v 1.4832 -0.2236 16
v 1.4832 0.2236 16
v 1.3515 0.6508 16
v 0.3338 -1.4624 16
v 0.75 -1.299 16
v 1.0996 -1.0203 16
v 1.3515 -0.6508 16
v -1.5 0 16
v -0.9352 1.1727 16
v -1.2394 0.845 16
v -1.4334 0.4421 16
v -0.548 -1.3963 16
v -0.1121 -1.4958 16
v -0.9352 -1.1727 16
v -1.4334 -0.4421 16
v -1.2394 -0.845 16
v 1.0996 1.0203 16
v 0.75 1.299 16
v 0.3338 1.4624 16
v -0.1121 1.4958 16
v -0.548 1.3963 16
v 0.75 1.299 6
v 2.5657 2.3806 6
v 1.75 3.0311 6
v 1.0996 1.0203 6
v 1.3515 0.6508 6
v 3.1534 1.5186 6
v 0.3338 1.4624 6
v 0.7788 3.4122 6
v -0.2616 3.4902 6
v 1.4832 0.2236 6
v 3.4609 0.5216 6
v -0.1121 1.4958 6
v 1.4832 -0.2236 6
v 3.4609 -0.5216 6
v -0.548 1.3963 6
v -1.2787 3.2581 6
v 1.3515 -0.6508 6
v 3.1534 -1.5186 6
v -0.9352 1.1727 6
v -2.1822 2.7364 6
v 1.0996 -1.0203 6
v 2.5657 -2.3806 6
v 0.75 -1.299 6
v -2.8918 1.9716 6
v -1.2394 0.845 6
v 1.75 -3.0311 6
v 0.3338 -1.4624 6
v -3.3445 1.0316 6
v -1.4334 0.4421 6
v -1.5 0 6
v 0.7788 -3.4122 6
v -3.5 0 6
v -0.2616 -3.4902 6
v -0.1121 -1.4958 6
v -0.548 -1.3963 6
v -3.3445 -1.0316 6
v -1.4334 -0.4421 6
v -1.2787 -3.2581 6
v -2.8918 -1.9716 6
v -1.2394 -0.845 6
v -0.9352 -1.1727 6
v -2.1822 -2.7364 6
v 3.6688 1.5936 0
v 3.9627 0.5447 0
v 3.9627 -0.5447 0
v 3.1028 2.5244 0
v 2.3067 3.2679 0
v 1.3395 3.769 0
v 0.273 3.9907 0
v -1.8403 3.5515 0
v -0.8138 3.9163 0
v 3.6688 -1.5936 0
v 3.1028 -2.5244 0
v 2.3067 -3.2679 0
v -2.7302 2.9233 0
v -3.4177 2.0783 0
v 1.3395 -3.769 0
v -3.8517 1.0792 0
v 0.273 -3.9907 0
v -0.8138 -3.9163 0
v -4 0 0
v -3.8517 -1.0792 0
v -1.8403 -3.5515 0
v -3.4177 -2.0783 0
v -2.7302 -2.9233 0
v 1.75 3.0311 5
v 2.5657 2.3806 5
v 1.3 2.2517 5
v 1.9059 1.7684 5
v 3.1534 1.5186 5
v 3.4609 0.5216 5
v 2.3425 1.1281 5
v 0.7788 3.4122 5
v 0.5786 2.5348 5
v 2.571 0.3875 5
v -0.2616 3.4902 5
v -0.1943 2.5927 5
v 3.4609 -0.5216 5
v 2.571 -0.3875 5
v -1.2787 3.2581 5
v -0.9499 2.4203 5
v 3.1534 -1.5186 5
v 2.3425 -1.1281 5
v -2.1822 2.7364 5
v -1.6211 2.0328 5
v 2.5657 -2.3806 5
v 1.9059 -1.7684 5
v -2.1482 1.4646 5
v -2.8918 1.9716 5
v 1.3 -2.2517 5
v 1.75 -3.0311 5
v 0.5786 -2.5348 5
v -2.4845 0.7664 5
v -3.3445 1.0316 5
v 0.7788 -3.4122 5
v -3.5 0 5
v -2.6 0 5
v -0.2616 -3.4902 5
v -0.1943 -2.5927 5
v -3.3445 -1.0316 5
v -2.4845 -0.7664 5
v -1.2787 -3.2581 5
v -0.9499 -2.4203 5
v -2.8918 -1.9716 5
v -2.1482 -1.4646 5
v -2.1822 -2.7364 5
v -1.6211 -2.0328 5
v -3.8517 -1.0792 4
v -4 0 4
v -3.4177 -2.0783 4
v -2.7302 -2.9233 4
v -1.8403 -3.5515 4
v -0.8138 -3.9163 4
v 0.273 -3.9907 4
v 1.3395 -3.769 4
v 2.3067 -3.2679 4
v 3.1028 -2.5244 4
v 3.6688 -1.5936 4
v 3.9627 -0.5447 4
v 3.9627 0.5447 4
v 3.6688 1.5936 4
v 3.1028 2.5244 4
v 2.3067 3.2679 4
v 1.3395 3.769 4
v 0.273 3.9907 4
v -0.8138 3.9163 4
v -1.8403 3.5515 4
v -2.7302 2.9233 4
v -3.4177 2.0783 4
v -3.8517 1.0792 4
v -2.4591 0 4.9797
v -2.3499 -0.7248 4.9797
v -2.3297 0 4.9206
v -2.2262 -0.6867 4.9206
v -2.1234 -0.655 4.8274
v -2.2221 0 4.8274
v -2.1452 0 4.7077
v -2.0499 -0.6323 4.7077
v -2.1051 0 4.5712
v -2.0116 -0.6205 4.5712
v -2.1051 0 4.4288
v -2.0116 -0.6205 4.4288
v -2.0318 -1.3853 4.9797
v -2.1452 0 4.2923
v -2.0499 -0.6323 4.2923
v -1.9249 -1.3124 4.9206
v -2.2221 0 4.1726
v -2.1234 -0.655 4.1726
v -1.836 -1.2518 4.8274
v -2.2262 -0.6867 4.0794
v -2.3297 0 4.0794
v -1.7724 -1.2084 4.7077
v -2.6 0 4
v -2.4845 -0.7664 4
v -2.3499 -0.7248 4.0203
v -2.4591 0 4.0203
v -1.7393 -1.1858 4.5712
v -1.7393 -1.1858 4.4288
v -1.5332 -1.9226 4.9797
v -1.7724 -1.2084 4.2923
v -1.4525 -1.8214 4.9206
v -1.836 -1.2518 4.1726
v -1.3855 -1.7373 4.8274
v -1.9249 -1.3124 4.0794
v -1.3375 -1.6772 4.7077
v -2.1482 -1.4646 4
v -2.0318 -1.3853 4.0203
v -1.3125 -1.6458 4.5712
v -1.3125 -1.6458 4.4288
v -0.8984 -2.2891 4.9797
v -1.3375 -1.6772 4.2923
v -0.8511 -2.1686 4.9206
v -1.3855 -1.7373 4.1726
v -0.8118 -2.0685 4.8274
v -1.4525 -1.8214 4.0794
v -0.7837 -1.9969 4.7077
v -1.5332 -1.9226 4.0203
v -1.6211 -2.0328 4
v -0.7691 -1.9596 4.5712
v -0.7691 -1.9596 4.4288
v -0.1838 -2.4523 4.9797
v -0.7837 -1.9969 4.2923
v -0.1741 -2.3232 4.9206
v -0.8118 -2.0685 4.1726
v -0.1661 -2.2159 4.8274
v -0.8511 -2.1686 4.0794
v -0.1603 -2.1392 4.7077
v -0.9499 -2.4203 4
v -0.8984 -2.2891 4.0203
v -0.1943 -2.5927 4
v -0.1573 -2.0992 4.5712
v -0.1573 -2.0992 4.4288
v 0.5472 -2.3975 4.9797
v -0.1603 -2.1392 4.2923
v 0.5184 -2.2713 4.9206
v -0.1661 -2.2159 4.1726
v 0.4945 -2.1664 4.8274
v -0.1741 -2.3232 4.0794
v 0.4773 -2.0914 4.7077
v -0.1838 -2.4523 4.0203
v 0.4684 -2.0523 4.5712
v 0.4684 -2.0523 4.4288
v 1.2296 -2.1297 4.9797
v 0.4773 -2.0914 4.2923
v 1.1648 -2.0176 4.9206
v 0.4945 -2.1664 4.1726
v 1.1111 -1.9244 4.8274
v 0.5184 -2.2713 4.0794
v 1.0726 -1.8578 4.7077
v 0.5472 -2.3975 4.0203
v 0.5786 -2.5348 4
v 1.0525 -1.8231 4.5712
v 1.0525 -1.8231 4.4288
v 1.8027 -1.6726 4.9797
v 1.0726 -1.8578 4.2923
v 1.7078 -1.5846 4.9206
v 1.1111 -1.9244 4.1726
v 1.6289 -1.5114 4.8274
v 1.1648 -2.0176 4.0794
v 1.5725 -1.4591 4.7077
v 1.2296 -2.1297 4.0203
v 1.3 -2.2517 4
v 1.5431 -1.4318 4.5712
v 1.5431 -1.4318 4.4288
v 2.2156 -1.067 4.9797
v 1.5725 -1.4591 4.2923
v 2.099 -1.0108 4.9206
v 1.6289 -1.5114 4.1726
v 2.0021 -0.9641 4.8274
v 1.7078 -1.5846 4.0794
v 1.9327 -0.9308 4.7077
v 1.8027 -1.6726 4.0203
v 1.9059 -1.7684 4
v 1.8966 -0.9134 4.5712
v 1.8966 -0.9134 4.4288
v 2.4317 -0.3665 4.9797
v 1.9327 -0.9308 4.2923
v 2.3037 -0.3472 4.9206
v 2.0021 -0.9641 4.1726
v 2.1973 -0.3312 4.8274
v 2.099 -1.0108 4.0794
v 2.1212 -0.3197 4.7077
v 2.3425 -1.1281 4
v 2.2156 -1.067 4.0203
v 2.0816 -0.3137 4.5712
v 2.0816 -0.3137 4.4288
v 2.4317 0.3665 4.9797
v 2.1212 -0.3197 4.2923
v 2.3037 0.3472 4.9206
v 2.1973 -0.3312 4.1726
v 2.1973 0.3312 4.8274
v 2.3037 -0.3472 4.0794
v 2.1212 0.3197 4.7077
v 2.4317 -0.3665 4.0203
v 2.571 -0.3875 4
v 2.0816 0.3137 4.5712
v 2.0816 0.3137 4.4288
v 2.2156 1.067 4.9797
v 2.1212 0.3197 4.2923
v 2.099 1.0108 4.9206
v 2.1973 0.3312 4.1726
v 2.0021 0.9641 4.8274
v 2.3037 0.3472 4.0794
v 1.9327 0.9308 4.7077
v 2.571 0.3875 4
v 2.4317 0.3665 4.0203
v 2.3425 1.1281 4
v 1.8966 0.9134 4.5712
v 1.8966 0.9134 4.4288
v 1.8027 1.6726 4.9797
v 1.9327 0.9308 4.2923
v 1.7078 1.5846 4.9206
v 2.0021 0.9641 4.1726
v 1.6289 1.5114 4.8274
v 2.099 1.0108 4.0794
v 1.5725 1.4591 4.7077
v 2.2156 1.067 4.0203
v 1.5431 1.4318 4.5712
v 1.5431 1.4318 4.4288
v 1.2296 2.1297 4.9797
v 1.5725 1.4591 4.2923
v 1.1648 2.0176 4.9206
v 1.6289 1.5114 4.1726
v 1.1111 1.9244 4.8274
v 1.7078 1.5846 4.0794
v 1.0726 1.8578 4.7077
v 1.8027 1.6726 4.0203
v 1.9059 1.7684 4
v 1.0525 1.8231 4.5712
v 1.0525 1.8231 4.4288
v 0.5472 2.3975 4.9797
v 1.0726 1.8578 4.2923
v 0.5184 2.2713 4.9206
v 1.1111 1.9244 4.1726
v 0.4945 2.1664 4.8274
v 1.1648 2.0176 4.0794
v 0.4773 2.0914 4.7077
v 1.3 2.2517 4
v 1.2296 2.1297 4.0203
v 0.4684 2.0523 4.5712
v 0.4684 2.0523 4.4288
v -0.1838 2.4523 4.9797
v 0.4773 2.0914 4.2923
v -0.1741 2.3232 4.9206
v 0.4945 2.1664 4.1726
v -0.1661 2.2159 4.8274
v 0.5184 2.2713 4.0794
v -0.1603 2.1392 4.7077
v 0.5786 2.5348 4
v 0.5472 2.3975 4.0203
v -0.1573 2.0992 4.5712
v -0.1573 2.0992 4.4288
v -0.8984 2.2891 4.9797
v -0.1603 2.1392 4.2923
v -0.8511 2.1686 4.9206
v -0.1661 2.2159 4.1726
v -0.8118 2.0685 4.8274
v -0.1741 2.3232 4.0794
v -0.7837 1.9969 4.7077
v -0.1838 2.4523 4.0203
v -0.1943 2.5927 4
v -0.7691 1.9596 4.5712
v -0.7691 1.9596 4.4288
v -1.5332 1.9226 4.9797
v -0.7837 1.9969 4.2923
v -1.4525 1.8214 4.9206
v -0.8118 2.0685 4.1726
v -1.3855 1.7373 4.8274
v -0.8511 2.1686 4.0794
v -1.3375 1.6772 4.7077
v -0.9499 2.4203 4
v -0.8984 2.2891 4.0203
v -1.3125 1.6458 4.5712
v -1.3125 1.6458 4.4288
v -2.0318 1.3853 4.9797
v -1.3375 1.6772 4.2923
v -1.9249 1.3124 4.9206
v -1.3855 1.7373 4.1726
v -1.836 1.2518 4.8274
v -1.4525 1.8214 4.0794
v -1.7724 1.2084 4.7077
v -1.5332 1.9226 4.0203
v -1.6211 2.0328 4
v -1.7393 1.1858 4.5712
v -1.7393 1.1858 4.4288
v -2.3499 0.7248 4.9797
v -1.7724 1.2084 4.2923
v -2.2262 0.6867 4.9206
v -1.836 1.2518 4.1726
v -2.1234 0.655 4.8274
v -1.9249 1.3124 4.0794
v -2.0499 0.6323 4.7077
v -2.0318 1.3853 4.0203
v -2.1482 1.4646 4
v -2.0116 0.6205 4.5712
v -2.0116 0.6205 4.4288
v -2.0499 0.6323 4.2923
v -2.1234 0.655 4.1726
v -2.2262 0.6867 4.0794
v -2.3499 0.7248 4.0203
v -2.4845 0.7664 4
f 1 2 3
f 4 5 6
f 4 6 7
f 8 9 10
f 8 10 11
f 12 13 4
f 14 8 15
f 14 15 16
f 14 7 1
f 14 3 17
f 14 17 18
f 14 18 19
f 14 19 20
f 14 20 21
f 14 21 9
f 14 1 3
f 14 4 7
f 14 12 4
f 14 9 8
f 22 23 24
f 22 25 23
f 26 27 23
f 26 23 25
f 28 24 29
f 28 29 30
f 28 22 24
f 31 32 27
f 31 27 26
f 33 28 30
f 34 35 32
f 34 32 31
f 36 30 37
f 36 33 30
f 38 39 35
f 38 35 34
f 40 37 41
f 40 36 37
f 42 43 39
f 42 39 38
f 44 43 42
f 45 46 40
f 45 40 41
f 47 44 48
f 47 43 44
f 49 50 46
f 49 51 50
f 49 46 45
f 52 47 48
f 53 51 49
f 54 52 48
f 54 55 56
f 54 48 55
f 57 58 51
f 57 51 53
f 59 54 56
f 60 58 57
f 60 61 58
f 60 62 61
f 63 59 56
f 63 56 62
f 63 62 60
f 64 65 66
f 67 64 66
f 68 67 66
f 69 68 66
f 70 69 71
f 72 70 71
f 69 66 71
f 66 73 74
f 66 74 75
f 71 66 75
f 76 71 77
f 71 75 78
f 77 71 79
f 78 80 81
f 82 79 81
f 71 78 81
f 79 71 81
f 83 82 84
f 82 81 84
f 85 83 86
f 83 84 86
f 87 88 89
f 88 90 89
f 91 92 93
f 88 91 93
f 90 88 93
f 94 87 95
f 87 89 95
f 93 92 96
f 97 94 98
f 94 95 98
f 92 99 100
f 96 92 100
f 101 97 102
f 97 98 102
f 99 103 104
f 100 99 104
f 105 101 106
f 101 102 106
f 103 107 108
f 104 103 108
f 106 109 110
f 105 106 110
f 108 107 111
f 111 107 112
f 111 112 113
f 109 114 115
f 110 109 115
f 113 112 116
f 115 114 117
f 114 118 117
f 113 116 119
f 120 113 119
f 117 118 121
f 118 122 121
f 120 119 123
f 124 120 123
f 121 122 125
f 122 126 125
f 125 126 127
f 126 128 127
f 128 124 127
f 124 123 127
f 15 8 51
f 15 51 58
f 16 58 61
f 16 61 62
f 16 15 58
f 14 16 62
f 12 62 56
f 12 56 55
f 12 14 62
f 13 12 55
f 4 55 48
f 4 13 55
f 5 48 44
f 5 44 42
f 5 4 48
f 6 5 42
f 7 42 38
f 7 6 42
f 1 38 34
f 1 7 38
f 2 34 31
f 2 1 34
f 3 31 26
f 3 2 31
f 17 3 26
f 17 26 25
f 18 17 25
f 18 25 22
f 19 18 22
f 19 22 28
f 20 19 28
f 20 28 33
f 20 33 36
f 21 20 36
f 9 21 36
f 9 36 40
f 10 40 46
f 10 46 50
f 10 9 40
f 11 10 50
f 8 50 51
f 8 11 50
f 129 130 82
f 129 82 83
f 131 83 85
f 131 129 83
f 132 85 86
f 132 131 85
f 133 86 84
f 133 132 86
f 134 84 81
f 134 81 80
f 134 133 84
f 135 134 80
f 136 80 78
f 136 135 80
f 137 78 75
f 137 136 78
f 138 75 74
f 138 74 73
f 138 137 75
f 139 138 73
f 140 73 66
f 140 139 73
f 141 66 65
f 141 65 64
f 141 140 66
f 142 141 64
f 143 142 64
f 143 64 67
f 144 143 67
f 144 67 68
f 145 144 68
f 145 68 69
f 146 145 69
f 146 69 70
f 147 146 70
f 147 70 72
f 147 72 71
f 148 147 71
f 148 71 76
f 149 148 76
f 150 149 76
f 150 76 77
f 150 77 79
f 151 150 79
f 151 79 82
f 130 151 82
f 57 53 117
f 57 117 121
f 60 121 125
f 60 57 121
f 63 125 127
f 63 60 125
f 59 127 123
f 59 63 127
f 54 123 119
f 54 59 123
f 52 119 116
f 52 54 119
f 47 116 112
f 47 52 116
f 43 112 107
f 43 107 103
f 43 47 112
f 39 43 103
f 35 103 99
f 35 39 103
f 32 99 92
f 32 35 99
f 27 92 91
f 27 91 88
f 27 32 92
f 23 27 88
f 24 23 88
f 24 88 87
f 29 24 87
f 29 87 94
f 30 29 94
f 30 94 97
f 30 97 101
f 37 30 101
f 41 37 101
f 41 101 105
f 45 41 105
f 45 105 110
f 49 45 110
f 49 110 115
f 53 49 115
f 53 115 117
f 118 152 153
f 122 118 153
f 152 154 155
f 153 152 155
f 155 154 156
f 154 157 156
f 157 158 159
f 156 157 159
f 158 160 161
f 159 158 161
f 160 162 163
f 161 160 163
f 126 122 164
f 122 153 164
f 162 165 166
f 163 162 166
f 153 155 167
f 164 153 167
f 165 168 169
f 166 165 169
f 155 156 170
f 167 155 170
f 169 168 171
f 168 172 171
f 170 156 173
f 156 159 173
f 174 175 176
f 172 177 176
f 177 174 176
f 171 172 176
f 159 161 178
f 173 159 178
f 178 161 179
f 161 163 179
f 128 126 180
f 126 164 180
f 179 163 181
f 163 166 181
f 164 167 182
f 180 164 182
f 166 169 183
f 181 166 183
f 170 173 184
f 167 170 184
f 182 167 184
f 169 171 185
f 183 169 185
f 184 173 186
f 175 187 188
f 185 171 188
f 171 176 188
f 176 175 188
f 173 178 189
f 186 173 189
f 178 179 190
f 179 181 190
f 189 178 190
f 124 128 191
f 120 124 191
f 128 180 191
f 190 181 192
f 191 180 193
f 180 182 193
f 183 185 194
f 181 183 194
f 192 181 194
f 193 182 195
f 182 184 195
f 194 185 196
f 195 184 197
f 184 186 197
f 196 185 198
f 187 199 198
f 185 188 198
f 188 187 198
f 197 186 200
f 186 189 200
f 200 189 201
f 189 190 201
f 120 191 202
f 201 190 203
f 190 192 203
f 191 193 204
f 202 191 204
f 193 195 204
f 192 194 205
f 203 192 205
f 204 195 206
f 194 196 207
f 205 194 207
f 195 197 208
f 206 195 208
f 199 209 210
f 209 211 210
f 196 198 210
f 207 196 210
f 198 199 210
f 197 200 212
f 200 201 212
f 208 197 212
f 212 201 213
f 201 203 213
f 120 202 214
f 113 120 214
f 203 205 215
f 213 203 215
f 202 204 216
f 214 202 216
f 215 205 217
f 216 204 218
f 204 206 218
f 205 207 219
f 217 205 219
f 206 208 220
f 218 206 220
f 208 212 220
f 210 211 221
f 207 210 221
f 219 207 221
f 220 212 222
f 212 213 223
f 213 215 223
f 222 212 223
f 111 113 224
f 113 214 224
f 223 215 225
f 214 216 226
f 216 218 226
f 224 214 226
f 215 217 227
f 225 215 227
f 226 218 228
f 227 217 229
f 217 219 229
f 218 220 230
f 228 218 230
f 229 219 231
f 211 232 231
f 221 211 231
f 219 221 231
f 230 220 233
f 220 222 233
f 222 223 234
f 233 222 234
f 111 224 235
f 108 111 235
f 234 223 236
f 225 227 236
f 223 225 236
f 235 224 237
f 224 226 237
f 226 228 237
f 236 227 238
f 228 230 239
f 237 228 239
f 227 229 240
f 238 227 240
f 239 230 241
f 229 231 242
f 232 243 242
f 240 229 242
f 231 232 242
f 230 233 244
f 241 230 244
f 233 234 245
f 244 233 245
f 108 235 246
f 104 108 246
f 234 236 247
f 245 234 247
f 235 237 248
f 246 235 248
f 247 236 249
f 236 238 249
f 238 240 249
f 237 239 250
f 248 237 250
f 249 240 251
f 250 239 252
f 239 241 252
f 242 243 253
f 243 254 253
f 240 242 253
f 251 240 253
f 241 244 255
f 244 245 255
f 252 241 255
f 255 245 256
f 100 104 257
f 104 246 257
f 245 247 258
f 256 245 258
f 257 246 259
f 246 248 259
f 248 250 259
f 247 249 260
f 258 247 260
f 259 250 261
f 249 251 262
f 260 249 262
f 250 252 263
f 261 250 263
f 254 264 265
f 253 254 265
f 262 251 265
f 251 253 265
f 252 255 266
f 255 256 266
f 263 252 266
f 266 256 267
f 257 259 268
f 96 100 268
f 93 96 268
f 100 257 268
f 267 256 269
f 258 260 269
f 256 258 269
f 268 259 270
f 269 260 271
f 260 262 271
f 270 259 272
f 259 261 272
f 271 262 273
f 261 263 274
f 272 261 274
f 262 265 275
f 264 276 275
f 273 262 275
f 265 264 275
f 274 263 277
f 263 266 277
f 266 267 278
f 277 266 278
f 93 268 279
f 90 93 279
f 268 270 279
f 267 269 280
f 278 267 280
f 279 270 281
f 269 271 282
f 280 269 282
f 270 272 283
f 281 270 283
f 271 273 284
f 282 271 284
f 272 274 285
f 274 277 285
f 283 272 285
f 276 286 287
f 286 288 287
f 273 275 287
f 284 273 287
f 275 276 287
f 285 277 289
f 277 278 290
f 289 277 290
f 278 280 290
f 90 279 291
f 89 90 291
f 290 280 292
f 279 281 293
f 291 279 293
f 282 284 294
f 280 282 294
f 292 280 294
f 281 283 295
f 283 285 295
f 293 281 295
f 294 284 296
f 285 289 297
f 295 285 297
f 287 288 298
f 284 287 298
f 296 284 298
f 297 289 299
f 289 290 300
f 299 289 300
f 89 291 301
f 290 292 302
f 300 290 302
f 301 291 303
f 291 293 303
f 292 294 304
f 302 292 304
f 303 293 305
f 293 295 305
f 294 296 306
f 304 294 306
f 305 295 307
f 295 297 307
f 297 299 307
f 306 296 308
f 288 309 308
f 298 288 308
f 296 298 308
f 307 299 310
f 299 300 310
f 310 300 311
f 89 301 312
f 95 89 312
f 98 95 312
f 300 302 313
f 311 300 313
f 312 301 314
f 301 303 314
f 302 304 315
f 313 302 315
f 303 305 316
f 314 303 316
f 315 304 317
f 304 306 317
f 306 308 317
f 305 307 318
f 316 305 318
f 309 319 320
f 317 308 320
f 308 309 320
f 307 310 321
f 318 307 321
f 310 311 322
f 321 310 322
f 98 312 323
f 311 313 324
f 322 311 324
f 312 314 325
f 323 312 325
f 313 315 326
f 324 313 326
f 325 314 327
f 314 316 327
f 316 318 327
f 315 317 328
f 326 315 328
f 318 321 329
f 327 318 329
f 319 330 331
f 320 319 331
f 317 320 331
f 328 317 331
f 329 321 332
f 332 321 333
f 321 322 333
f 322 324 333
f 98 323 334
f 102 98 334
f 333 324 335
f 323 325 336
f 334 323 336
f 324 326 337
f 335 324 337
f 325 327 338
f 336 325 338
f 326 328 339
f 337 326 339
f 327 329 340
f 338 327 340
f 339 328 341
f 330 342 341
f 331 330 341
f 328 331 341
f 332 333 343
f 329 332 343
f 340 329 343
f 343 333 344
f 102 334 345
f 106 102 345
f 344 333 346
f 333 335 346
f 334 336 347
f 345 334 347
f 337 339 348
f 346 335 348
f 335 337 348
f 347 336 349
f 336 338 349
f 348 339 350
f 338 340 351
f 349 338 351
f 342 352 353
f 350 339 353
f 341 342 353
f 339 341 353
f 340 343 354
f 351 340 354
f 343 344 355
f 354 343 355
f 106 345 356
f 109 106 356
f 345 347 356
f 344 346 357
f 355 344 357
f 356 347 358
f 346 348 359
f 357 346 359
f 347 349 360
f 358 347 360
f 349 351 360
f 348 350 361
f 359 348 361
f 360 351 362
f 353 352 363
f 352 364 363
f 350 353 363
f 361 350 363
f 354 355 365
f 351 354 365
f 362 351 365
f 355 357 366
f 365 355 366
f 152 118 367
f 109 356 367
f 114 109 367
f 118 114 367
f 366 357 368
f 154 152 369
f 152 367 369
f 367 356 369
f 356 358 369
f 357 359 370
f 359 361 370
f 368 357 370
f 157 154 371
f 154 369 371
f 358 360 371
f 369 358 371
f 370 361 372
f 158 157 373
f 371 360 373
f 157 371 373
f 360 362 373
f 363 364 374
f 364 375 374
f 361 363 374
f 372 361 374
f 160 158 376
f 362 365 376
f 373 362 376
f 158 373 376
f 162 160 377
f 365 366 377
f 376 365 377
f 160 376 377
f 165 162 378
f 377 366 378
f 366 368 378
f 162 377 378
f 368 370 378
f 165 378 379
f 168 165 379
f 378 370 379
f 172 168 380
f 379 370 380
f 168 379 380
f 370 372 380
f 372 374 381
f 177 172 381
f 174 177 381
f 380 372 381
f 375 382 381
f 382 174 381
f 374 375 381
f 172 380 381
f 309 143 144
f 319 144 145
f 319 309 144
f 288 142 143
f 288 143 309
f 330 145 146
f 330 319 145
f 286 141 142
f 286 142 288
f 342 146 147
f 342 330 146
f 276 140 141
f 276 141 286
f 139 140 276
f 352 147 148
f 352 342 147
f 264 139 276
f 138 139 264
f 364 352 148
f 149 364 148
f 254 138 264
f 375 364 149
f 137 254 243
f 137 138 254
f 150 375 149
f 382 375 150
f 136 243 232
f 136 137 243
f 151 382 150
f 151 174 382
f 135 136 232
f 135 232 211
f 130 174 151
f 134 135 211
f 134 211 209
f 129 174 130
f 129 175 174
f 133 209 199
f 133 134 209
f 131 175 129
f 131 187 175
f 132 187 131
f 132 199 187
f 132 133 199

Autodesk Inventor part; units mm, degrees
ref_plane "YZ Plane" through (0, 0, 0) normal (1, 0, 0) x (0, 1, 0)
ref_plane "XZ Plane" through (0, 0, 0) normal (0, 1, 0) x (-1, 0, 0)
ref_plane "XY Plane" through (0, 0, 0) normal (0, 0, 1) x (1, 0, 0)
sketch "スケッチ1" plane through (0, 0, 0) normal (0, 1, 0) x (-1, 0, 0)
  line L0 (0, 0) -> (0, 16)
  line L1 (0, 0) -> (4, 0)
  line L2 (4, 0) -> (4, 4)
  line L3 (4, 4) -> (2.6, 4)
  line L4 (2.6, 4) -> (2.6, 5) construction
  line L5 (2.6, 5) -> (3.5, 5)
  line L6 (3.5, 5) -> (3.5, 6)
  line L7 (3.5, 6) -> (1.5, 6)
  line L8 (1.5, 6) -> (1.5, 16)
  line L9 (1.5, 16) -> (0, 16)
  arc A0 (2.6, 5) -> (2.6, 4) centre (2.6, 4.5) ccw
  line L10 (2.6, 4.5) -> (2.1, 4.5) construction
  dimension "d4" = 1
  dimension "d5" = 6
  dimension "d7" = 4
  dimension "d8" = 10
  dimension "d11" = 2.1
  dimension "d12" = 3
  dimension "d13" = 8
  dimension "d14" = 7
revolve "回転1" add sketch "スケッチ1" angle 360 about axis through (0, 0, 0) along (0, 0, 1)
thread "ねじ1" size "M3x0.5" class "6g" standard "ANSI Metric M Profile" full length
properties part number "SPNFL-BRN-M3-10" material "ステンレス鋼 AISI 304"
